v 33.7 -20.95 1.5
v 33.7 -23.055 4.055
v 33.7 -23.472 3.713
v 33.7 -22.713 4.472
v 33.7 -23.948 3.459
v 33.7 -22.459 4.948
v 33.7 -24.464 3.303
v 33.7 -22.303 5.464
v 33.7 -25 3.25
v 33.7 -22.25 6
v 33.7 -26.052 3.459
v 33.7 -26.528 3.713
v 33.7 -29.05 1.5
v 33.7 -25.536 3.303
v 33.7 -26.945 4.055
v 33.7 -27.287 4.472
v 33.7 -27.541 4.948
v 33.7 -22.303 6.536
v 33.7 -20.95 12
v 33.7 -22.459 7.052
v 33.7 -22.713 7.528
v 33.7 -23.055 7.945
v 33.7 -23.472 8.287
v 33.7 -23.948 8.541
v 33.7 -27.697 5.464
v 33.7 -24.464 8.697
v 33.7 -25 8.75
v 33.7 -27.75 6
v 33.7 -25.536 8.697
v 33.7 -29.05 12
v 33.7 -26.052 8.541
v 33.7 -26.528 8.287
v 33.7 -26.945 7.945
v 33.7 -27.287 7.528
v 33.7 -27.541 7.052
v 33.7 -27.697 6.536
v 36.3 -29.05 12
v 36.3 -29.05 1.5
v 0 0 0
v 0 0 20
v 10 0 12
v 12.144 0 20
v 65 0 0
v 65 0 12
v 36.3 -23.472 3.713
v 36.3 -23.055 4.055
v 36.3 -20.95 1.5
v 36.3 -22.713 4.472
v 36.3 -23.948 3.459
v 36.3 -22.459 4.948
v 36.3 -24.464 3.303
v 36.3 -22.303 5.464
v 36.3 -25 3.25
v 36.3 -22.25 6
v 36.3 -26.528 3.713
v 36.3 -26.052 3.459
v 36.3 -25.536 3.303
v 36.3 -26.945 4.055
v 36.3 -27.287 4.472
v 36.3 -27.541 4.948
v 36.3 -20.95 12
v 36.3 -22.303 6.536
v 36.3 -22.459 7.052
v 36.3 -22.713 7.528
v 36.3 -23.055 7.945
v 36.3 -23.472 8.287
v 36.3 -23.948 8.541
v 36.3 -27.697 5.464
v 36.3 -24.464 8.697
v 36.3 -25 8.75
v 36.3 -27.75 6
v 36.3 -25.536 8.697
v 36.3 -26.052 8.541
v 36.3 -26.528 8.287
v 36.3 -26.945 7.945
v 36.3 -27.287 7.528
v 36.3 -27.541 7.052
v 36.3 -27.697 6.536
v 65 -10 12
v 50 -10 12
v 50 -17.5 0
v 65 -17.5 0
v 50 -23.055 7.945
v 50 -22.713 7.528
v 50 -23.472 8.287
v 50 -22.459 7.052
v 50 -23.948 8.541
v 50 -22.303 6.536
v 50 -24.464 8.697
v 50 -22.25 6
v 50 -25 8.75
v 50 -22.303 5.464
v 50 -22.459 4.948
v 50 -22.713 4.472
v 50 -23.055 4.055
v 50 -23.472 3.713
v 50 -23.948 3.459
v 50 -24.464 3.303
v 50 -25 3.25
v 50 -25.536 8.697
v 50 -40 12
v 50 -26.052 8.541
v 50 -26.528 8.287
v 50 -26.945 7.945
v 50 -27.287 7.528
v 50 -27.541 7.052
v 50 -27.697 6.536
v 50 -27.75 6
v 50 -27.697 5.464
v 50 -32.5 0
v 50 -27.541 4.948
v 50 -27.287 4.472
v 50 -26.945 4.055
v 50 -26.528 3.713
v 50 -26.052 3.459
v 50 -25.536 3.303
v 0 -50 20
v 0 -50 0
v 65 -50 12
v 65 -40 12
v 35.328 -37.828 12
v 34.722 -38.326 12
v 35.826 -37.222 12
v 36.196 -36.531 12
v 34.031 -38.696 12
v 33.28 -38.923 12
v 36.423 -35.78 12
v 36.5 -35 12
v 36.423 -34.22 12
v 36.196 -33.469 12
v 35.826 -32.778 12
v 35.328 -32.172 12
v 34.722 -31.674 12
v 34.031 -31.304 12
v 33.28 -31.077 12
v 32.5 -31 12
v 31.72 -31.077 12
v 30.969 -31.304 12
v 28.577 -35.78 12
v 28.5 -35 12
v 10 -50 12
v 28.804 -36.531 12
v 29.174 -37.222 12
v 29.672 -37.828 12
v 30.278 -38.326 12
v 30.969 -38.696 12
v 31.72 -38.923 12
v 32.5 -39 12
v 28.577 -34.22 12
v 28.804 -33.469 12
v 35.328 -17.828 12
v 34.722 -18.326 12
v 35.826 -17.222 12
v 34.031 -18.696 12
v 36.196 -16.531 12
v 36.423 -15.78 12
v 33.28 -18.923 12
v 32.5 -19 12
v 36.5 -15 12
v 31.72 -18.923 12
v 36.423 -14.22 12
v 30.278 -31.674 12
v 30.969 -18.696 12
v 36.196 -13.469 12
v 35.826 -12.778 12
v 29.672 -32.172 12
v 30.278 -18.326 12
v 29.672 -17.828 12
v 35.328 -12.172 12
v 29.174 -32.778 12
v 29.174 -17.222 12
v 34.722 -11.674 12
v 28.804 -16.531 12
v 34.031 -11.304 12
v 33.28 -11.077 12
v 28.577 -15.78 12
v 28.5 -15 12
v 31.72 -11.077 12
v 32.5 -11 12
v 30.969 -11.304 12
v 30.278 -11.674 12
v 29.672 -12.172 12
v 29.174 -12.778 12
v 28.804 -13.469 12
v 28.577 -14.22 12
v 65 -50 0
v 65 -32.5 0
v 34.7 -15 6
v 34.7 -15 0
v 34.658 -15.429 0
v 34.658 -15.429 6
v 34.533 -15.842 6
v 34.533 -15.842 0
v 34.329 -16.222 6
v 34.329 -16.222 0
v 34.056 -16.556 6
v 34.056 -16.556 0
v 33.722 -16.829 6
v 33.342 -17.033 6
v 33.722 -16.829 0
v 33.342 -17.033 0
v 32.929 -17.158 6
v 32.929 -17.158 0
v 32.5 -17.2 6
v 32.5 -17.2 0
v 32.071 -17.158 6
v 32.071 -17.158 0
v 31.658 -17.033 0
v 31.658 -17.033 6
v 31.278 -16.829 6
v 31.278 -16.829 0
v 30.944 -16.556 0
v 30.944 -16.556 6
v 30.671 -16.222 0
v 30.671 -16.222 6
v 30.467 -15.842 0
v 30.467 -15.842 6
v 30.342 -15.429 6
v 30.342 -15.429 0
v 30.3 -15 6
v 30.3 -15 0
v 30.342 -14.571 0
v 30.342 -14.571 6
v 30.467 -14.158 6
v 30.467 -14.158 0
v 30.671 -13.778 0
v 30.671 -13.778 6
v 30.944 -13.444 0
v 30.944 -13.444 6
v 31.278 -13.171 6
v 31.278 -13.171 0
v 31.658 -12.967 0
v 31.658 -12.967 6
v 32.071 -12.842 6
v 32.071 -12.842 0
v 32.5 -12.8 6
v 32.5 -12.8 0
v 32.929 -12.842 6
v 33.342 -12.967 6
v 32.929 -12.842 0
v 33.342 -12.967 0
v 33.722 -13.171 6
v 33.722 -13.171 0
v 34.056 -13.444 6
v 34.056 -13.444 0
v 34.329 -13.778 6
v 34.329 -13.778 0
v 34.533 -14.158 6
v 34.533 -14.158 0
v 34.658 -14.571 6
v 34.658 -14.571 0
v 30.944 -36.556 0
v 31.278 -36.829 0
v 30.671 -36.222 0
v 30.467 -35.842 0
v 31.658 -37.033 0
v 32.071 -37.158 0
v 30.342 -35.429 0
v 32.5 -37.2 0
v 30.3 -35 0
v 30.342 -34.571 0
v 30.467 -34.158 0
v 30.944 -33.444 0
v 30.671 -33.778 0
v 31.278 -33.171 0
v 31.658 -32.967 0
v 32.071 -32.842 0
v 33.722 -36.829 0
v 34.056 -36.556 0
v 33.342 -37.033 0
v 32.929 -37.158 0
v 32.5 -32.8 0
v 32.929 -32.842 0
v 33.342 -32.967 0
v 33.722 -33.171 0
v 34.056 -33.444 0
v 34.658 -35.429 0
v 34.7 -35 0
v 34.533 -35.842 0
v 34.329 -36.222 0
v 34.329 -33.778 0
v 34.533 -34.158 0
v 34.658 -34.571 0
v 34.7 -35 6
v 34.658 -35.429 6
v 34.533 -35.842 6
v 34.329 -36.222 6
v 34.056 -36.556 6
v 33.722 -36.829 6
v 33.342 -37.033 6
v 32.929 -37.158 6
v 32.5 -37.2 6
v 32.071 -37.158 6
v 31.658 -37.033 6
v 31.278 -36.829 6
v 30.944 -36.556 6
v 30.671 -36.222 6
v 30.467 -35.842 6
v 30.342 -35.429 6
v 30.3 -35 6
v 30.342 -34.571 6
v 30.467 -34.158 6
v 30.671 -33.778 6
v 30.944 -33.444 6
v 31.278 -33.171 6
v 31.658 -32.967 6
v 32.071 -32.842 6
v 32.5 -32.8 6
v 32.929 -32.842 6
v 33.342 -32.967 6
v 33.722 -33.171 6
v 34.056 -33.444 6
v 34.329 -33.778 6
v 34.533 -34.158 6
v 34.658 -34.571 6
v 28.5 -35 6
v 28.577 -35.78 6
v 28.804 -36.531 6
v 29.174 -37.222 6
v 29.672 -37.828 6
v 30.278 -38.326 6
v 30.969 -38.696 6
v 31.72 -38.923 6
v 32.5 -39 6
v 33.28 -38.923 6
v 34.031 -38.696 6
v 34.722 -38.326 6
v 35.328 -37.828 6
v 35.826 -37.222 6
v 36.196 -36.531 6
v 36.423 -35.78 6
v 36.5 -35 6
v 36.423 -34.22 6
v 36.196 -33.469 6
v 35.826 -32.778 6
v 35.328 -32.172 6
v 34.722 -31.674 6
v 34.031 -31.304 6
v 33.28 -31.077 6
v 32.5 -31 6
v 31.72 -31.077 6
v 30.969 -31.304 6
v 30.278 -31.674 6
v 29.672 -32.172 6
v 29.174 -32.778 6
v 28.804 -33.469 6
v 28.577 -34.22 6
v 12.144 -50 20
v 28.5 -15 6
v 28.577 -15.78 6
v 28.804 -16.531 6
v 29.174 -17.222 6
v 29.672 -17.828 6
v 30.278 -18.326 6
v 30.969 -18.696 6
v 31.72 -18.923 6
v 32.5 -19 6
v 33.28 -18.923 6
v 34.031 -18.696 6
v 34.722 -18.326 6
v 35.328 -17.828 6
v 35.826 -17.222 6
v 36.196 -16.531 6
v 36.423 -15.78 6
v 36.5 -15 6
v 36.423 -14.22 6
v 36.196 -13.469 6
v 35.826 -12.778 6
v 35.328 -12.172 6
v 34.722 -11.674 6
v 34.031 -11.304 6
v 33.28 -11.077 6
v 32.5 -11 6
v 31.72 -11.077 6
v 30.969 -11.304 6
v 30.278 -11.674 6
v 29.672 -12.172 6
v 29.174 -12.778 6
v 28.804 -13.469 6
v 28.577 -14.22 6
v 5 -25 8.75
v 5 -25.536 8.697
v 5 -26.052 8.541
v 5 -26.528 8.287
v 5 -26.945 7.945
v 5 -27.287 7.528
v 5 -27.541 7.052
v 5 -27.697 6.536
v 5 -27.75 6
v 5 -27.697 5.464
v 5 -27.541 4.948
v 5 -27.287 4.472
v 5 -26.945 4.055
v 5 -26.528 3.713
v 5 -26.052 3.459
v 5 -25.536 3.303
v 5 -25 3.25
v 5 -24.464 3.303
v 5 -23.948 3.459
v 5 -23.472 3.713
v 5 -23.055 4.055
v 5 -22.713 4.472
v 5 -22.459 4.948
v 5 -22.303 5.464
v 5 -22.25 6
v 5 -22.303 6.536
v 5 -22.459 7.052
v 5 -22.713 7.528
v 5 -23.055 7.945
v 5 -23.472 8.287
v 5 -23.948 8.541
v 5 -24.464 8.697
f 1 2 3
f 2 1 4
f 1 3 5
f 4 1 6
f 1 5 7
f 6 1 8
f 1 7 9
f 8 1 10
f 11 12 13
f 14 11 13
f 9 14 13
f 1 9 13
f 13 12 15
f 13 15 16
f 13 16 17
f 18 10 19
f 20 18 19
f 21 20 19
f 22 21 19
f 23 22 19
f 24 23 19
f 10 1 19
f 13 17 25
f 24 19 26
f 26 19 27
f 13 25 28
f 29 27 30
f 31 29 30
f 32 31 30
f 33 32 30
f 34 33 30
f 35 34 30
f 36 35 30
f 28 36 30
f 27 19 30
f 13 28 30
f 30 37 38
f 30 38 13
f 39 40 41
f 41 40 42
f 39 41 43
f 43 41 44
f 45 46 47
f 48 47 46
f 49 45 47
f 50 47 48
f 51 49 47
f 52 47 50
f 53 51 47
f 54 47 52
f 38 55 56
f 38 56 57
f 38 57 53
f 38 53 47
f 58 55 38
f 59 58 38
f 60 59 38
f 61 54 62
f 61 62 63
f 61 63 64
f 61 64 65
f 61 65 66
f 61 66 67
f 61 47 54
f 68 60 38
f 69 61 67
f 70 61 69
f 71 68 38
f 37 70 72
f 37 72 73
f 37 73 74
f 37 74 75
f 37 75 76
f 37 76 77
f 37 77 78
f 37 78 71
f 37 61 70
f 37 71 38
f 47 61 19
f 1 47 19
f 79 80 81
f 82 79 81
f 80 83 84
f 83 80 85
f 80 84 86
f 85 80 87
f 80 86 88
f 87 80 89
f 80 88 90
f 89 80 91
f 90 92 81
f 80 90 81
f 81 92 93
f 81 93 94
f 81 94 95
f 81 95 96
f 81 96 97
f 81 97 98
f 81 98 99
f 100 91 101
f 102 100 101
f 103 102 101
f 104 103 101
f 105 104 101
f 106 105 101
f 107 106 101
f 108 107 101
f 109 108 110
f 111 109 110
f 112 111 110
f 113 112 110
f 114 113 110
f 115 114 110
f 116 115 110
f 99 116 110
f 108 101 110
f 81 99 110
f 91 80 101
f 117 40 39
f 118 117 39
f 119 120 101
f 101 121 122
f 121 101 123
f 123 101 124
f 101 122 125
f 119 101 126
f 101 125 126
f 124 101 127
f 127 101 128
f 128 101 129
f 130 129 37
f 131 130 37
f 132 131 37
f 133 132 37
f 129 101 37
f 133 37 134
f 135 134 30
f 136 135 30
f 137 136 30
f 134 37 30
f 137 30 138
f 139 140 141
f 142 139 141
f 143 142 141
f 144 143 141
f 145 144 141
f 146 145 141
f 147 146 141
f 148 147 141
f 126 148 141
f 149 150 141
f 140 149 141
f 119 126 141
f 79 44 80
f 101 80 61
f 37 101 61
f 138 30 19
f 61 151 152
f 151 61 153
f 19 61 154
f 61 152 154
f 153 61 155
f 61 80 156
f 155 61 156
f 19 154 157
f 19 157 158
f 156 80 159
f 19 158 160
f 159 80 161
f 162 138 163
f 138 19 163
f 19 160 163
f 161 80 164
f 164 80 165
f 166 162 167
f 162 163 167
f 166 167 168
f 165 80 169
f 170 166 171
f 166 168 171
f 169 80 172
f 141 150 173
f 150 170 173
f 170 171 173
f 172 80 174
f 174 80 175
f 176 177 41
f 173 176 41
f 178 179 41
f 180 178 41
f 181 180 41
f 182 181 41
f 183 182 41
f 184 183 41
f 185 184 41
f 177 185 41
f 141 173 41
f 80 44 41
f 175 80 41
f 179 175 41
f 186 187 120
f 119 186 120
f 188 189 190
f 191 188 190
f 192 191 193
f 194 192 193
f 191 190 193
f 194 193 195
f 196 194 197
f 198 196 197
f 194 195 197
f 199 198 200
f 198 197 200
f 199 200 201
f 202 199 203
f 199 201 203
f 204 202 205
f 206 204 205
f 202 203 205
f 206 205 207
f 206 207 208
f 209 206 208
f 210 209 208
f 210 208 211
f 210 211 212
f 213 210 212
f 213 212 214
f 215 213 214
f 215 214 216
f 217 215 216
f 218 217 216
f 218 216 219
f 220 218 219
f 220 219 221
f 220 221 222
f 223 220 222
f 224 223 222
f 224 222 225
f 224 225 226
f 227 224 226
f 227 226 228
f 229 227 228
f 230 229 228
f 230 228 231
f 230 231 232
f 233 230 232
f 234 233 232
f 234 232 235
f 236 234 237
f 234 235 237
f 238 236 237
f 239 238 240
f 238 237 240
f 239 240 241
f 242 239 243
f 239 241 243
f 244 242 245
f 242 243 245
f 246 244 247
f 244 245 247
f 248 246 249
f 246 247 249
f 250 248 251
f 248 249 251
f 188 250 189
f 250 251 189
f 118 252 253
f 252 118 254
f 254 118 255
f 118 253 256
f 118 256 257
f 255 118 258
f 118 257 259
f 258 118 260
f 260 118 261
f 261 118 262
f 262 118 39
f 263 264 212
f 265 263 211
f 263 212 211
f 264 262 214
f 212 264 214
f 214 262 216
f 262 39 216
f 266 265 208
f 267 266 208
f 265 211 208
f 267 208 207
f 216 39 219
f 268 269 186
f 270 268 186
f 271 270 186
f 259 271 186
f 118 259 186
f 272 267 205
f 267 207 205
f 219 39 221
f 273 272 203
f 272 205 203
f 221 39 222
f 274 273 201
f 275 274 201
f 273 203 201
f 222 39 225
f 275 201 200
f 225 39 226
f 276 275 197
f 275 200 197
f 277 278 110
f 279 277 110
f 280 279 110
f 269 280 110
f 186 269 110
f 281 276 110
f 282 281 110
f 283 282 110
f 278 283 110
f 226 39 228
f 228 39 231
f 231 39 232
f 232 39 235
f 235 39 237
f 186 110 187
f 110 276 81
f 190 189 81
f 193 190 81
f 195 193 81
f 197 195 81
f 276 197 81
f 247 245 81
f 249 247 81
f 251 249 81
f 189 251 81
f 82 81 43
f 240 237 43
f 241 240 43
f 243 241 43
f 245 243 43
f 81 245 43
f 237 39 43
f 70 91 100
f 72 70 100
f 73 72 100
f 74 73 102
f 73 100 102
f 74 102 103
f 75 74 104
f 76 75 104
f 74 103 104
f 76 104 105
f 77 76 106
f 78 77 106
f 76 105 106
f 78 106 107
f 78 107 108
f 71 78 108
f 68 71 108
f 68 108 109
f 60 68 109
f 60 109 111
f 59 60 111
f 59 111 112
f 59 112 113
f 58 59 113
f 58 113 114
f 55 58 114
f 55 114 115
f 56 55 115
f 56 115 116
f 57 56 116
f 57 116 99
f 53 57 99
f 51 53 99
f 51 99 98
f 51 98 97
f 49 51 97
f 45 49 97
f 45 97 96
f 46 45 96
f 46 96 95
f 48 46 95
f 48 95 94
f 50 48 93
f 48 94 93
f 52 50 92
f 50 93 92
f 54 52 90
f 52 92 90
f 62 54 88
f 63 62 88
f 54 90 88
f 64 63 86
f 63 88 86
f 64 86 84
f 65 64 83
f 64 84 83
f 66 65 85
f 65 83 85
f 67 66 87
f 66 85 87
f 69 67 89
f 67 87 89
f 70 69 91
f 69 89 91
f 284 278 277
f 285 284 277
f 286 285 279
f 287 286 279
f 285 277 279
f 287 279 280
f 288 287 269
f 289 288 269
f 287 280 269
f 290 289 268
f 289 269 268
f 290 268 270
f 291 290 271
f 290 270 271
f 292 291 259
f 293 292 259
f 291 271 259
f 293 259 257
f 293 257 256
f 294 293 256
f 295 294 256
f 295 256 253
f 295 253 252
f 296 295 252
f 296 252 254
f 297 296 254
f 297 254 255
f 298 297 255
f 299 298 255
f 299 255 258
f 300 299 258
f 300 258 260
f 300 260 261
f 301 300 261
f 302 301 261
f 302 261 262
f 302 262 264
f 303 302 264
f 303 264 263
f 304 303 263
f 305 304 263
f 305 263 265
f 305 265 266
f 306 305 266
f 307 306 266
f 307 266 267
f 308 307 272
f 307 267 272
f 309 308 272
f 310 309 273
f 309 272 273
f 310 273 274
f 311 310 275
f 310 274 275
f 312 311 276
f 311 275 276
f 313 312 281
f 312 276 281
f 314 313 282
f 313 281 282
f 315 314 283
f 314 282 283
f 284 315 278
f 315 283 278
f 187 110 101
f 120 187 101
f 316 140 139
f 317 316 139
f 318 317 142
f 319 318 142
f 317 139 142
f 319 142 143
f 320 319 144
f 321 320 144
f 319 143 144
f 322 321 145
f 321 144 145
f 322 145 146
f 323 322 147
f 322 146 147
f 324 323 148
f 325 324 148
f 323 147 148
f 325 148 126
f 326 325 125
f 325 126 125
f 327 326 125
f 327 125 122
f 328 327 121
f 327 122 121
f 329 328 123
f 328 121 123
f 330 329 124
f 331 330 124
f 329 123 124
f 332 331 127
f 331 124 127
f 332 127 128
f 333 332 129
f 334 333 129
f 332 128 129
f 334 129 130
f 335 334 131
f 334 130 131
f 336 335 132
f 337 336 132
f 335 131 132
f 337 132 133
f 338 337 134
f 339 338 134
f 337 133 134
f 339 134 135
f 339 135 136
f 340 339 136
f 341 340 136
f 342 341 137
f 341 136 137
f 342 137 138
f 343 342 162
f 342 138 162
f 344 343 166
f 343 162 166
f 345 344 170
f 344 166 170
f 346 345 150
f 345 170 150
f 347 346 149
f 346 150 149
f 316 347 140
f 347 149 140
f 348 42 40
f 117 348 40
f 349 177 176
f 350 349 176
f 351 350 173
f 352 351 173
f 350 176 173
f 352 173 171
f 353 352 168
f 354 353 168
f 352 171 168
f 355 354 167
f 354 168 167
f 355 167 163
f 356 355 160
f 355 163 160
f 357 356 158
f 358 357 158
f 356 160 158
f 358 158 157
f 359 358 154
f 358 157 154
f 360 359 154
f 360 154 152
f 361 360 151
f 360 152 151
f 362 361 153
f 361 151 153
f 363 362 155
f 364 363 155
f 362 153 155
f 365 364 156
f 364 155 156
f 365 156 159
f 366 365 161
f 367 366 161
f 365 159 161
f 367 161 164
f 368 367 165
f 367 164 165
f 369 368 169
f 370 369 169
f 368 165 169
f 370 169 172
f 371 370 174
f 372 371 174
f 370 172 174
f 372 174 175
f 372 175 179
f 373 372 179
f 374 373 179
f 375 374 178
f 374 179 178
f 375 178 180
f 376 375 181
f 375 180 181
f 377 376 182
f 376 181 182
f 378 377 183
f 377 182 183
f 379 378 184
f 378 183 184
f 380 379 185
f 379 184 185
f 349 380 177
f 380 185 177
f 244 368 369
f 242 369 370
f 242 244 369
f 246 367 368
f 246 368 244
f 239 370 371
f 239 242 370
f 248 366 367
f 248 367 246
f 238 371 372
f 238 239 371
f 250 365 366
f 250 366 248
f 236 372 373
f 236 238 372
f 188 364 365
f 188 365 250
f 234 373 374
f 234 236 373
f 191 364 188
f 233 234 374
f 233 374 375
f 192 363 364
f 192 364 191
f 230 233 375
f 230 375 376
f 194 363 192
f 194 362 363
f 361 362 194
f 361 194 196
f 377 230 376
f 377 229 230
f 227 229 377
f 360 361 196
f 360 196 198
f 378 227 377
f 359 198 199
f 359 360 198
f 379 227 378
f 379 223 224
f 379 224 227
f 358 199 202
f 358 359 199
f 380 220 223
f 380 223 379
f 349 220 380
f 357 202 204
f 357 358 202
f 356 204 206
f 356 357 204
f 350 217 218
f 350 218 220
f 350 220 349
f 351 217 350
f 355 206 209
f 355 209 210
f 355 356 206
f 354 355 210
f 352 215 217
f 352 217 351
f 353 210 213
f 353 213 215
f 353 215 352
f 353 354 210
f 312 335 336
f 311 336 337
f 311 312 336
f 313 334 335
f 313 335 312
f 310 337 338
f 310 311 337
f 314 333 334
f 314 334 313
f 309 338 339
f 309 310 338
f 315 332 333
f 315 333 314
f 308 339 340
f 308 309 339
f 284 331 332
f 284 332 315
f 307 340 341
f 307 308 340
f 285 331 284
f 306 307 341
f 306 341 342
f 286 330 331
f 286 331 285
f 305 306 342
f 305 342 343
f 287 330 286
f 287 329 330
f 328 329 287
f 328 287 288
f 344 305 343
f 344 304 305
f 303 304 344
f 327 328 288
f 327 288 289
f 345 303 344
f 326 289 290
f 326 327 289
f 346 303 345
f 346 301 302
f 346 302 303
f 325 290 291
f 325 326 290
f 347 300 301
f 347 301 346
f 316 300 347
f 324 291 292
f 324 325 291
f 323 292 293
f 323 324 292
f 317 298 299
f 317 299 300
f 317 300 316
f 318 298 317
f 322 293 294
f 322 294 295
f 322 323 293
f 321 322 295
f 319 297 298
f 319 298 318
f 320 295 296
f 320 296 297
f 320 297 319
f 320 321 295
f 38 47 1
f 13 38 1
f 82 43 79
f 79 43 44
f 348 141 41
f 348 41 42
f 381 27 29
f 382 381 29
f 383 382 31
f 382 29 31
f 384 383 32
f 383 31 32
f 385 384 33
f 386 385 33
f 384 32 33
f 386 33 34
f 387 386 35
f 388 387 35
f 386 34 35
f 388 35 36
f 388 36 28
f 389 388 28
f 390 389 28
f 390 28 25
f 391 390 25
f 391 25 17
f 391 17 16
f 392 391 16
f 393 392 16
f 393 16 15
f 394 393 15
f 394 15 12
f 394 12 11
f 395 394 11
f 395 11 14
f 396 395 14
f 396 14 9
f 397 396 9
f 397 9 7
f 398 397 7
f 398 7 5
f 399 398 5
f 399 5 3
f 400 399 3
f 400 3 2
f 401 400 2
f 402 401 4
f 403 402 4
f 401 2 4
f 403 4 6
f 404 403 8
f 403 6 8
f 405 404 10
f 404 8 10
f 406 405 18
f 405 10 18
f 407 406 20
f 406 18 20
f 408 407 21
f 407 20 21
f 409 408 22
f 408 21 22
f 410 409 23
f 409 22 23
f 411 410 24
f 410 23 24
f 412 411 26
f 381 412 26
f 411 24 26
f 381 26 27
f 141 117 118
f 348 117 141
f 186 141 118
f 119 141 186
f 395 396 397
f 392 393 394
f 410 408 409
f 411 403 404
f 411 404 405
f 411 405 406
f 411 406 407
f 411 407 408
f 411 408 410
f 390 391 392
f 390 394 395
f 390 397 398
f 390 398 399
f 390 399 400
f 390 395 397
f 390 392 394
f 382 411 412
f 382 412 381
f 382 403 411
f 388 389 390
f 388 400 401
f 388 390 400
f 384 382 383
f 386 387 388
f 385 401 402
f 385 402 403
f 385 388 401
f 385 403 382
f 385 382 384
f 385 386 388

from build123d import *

# Parameters (mm, degrees)
PAD_DEPTH       = 50
POCKET_DEPTH    = 15
SKETCH003_R     = 2.2
POCKET002_DEPTH = 20.001
SKETCH004_W     = 2.6
SKETCH004_H     = 8.1
POCKET003_DEPTH = 10.5
SKETCH005_R     = 4
POCKET004_DEPTH = 6
SKETCH002_R     = 2.75
POCKET005_DEPTH = 45


with BuildPart() as part:
    # Sketch → Pad (new body)
    with BuildSketch(Plane.XZ):
        Polygon((0, 0), (65, 0), (65, 12), (10, 12), (12.143594, 20), (0, 20), align=None)
    extrude(amount=PAD_DEPTH)

    # Sketch001 (on Face2 of Pad) → Pocket (cut)
    with BuildSketch(Plane(origin=(65, 0, 0), x_dir=(0, 0, 1), z_dir=(1, 0, 0))):
        Polygon((0, 32.5), (12, 40), (12, 10), (0, 17.5), (0, 25), align=None)
    extrude(amount=-POCKET_DEPTH, mode=Mode.SUBTRACT)

    # Sketch003 → Pocket002 (cut, through all)
    with BuildSketch(Plane(origin=(0, 0, 0), x_dir=(1, 0, 0), z_dir=(0, 0, -1))):
        with Locations((32.5, 35)):
            Circle(SKETCH003_R)
        with Locations((32.5, 15)):
            Circle(SKETCH003_R)
    extrude(amount=-POCKET002_DEPTH, mode=Mode.SUBTRACT)

    # Sketch004 (on Face12 of Pocket002) → Pocket003 (cut)
    with BuildSketch(Plane(origin=(0, 0, 12), x_dir=(-1, 0, 0), z_dir=(0, 0, 1))):
        with Locations((-35, 25)):
            Rectangle(SKETCH004_W, SKETCH004_H)
    extrude(amount=-POCKET003_DEPTH, mode=Mode.SUBTRACT)

    # Sketch005 (on Face12 of Pocket003) → Pocket004 (cut)
    with BuildSketch(Plane(origin=(0, 0, 12), x_dir=(-1, 0, 0), z_dir=(0, 0, 1))):
        with Locations((-32.5, 35)):
            Circle(SKETCH005_R)
        with Locations((-32.5, 15)):
            Circle(SKETCH005_R)
    extrude(amount=-POCKET004_DEPTH, mode=Mode.SUBTRACT)

    # Sketch002 (on Face5 of Pocket) → Pocket005 (cut)
    with BuildSketch(Plane(origin=(50, 0, 0), x_dir=(0, 0, 1), z_dir=(1, 0, 0))):
        with Locations((6, 25)):
            Circle(SKETCH002_R)
    extrude(amount=-POCKET005_DEPTH, mode=Mode.SUBTRACT)


solid = part.part
